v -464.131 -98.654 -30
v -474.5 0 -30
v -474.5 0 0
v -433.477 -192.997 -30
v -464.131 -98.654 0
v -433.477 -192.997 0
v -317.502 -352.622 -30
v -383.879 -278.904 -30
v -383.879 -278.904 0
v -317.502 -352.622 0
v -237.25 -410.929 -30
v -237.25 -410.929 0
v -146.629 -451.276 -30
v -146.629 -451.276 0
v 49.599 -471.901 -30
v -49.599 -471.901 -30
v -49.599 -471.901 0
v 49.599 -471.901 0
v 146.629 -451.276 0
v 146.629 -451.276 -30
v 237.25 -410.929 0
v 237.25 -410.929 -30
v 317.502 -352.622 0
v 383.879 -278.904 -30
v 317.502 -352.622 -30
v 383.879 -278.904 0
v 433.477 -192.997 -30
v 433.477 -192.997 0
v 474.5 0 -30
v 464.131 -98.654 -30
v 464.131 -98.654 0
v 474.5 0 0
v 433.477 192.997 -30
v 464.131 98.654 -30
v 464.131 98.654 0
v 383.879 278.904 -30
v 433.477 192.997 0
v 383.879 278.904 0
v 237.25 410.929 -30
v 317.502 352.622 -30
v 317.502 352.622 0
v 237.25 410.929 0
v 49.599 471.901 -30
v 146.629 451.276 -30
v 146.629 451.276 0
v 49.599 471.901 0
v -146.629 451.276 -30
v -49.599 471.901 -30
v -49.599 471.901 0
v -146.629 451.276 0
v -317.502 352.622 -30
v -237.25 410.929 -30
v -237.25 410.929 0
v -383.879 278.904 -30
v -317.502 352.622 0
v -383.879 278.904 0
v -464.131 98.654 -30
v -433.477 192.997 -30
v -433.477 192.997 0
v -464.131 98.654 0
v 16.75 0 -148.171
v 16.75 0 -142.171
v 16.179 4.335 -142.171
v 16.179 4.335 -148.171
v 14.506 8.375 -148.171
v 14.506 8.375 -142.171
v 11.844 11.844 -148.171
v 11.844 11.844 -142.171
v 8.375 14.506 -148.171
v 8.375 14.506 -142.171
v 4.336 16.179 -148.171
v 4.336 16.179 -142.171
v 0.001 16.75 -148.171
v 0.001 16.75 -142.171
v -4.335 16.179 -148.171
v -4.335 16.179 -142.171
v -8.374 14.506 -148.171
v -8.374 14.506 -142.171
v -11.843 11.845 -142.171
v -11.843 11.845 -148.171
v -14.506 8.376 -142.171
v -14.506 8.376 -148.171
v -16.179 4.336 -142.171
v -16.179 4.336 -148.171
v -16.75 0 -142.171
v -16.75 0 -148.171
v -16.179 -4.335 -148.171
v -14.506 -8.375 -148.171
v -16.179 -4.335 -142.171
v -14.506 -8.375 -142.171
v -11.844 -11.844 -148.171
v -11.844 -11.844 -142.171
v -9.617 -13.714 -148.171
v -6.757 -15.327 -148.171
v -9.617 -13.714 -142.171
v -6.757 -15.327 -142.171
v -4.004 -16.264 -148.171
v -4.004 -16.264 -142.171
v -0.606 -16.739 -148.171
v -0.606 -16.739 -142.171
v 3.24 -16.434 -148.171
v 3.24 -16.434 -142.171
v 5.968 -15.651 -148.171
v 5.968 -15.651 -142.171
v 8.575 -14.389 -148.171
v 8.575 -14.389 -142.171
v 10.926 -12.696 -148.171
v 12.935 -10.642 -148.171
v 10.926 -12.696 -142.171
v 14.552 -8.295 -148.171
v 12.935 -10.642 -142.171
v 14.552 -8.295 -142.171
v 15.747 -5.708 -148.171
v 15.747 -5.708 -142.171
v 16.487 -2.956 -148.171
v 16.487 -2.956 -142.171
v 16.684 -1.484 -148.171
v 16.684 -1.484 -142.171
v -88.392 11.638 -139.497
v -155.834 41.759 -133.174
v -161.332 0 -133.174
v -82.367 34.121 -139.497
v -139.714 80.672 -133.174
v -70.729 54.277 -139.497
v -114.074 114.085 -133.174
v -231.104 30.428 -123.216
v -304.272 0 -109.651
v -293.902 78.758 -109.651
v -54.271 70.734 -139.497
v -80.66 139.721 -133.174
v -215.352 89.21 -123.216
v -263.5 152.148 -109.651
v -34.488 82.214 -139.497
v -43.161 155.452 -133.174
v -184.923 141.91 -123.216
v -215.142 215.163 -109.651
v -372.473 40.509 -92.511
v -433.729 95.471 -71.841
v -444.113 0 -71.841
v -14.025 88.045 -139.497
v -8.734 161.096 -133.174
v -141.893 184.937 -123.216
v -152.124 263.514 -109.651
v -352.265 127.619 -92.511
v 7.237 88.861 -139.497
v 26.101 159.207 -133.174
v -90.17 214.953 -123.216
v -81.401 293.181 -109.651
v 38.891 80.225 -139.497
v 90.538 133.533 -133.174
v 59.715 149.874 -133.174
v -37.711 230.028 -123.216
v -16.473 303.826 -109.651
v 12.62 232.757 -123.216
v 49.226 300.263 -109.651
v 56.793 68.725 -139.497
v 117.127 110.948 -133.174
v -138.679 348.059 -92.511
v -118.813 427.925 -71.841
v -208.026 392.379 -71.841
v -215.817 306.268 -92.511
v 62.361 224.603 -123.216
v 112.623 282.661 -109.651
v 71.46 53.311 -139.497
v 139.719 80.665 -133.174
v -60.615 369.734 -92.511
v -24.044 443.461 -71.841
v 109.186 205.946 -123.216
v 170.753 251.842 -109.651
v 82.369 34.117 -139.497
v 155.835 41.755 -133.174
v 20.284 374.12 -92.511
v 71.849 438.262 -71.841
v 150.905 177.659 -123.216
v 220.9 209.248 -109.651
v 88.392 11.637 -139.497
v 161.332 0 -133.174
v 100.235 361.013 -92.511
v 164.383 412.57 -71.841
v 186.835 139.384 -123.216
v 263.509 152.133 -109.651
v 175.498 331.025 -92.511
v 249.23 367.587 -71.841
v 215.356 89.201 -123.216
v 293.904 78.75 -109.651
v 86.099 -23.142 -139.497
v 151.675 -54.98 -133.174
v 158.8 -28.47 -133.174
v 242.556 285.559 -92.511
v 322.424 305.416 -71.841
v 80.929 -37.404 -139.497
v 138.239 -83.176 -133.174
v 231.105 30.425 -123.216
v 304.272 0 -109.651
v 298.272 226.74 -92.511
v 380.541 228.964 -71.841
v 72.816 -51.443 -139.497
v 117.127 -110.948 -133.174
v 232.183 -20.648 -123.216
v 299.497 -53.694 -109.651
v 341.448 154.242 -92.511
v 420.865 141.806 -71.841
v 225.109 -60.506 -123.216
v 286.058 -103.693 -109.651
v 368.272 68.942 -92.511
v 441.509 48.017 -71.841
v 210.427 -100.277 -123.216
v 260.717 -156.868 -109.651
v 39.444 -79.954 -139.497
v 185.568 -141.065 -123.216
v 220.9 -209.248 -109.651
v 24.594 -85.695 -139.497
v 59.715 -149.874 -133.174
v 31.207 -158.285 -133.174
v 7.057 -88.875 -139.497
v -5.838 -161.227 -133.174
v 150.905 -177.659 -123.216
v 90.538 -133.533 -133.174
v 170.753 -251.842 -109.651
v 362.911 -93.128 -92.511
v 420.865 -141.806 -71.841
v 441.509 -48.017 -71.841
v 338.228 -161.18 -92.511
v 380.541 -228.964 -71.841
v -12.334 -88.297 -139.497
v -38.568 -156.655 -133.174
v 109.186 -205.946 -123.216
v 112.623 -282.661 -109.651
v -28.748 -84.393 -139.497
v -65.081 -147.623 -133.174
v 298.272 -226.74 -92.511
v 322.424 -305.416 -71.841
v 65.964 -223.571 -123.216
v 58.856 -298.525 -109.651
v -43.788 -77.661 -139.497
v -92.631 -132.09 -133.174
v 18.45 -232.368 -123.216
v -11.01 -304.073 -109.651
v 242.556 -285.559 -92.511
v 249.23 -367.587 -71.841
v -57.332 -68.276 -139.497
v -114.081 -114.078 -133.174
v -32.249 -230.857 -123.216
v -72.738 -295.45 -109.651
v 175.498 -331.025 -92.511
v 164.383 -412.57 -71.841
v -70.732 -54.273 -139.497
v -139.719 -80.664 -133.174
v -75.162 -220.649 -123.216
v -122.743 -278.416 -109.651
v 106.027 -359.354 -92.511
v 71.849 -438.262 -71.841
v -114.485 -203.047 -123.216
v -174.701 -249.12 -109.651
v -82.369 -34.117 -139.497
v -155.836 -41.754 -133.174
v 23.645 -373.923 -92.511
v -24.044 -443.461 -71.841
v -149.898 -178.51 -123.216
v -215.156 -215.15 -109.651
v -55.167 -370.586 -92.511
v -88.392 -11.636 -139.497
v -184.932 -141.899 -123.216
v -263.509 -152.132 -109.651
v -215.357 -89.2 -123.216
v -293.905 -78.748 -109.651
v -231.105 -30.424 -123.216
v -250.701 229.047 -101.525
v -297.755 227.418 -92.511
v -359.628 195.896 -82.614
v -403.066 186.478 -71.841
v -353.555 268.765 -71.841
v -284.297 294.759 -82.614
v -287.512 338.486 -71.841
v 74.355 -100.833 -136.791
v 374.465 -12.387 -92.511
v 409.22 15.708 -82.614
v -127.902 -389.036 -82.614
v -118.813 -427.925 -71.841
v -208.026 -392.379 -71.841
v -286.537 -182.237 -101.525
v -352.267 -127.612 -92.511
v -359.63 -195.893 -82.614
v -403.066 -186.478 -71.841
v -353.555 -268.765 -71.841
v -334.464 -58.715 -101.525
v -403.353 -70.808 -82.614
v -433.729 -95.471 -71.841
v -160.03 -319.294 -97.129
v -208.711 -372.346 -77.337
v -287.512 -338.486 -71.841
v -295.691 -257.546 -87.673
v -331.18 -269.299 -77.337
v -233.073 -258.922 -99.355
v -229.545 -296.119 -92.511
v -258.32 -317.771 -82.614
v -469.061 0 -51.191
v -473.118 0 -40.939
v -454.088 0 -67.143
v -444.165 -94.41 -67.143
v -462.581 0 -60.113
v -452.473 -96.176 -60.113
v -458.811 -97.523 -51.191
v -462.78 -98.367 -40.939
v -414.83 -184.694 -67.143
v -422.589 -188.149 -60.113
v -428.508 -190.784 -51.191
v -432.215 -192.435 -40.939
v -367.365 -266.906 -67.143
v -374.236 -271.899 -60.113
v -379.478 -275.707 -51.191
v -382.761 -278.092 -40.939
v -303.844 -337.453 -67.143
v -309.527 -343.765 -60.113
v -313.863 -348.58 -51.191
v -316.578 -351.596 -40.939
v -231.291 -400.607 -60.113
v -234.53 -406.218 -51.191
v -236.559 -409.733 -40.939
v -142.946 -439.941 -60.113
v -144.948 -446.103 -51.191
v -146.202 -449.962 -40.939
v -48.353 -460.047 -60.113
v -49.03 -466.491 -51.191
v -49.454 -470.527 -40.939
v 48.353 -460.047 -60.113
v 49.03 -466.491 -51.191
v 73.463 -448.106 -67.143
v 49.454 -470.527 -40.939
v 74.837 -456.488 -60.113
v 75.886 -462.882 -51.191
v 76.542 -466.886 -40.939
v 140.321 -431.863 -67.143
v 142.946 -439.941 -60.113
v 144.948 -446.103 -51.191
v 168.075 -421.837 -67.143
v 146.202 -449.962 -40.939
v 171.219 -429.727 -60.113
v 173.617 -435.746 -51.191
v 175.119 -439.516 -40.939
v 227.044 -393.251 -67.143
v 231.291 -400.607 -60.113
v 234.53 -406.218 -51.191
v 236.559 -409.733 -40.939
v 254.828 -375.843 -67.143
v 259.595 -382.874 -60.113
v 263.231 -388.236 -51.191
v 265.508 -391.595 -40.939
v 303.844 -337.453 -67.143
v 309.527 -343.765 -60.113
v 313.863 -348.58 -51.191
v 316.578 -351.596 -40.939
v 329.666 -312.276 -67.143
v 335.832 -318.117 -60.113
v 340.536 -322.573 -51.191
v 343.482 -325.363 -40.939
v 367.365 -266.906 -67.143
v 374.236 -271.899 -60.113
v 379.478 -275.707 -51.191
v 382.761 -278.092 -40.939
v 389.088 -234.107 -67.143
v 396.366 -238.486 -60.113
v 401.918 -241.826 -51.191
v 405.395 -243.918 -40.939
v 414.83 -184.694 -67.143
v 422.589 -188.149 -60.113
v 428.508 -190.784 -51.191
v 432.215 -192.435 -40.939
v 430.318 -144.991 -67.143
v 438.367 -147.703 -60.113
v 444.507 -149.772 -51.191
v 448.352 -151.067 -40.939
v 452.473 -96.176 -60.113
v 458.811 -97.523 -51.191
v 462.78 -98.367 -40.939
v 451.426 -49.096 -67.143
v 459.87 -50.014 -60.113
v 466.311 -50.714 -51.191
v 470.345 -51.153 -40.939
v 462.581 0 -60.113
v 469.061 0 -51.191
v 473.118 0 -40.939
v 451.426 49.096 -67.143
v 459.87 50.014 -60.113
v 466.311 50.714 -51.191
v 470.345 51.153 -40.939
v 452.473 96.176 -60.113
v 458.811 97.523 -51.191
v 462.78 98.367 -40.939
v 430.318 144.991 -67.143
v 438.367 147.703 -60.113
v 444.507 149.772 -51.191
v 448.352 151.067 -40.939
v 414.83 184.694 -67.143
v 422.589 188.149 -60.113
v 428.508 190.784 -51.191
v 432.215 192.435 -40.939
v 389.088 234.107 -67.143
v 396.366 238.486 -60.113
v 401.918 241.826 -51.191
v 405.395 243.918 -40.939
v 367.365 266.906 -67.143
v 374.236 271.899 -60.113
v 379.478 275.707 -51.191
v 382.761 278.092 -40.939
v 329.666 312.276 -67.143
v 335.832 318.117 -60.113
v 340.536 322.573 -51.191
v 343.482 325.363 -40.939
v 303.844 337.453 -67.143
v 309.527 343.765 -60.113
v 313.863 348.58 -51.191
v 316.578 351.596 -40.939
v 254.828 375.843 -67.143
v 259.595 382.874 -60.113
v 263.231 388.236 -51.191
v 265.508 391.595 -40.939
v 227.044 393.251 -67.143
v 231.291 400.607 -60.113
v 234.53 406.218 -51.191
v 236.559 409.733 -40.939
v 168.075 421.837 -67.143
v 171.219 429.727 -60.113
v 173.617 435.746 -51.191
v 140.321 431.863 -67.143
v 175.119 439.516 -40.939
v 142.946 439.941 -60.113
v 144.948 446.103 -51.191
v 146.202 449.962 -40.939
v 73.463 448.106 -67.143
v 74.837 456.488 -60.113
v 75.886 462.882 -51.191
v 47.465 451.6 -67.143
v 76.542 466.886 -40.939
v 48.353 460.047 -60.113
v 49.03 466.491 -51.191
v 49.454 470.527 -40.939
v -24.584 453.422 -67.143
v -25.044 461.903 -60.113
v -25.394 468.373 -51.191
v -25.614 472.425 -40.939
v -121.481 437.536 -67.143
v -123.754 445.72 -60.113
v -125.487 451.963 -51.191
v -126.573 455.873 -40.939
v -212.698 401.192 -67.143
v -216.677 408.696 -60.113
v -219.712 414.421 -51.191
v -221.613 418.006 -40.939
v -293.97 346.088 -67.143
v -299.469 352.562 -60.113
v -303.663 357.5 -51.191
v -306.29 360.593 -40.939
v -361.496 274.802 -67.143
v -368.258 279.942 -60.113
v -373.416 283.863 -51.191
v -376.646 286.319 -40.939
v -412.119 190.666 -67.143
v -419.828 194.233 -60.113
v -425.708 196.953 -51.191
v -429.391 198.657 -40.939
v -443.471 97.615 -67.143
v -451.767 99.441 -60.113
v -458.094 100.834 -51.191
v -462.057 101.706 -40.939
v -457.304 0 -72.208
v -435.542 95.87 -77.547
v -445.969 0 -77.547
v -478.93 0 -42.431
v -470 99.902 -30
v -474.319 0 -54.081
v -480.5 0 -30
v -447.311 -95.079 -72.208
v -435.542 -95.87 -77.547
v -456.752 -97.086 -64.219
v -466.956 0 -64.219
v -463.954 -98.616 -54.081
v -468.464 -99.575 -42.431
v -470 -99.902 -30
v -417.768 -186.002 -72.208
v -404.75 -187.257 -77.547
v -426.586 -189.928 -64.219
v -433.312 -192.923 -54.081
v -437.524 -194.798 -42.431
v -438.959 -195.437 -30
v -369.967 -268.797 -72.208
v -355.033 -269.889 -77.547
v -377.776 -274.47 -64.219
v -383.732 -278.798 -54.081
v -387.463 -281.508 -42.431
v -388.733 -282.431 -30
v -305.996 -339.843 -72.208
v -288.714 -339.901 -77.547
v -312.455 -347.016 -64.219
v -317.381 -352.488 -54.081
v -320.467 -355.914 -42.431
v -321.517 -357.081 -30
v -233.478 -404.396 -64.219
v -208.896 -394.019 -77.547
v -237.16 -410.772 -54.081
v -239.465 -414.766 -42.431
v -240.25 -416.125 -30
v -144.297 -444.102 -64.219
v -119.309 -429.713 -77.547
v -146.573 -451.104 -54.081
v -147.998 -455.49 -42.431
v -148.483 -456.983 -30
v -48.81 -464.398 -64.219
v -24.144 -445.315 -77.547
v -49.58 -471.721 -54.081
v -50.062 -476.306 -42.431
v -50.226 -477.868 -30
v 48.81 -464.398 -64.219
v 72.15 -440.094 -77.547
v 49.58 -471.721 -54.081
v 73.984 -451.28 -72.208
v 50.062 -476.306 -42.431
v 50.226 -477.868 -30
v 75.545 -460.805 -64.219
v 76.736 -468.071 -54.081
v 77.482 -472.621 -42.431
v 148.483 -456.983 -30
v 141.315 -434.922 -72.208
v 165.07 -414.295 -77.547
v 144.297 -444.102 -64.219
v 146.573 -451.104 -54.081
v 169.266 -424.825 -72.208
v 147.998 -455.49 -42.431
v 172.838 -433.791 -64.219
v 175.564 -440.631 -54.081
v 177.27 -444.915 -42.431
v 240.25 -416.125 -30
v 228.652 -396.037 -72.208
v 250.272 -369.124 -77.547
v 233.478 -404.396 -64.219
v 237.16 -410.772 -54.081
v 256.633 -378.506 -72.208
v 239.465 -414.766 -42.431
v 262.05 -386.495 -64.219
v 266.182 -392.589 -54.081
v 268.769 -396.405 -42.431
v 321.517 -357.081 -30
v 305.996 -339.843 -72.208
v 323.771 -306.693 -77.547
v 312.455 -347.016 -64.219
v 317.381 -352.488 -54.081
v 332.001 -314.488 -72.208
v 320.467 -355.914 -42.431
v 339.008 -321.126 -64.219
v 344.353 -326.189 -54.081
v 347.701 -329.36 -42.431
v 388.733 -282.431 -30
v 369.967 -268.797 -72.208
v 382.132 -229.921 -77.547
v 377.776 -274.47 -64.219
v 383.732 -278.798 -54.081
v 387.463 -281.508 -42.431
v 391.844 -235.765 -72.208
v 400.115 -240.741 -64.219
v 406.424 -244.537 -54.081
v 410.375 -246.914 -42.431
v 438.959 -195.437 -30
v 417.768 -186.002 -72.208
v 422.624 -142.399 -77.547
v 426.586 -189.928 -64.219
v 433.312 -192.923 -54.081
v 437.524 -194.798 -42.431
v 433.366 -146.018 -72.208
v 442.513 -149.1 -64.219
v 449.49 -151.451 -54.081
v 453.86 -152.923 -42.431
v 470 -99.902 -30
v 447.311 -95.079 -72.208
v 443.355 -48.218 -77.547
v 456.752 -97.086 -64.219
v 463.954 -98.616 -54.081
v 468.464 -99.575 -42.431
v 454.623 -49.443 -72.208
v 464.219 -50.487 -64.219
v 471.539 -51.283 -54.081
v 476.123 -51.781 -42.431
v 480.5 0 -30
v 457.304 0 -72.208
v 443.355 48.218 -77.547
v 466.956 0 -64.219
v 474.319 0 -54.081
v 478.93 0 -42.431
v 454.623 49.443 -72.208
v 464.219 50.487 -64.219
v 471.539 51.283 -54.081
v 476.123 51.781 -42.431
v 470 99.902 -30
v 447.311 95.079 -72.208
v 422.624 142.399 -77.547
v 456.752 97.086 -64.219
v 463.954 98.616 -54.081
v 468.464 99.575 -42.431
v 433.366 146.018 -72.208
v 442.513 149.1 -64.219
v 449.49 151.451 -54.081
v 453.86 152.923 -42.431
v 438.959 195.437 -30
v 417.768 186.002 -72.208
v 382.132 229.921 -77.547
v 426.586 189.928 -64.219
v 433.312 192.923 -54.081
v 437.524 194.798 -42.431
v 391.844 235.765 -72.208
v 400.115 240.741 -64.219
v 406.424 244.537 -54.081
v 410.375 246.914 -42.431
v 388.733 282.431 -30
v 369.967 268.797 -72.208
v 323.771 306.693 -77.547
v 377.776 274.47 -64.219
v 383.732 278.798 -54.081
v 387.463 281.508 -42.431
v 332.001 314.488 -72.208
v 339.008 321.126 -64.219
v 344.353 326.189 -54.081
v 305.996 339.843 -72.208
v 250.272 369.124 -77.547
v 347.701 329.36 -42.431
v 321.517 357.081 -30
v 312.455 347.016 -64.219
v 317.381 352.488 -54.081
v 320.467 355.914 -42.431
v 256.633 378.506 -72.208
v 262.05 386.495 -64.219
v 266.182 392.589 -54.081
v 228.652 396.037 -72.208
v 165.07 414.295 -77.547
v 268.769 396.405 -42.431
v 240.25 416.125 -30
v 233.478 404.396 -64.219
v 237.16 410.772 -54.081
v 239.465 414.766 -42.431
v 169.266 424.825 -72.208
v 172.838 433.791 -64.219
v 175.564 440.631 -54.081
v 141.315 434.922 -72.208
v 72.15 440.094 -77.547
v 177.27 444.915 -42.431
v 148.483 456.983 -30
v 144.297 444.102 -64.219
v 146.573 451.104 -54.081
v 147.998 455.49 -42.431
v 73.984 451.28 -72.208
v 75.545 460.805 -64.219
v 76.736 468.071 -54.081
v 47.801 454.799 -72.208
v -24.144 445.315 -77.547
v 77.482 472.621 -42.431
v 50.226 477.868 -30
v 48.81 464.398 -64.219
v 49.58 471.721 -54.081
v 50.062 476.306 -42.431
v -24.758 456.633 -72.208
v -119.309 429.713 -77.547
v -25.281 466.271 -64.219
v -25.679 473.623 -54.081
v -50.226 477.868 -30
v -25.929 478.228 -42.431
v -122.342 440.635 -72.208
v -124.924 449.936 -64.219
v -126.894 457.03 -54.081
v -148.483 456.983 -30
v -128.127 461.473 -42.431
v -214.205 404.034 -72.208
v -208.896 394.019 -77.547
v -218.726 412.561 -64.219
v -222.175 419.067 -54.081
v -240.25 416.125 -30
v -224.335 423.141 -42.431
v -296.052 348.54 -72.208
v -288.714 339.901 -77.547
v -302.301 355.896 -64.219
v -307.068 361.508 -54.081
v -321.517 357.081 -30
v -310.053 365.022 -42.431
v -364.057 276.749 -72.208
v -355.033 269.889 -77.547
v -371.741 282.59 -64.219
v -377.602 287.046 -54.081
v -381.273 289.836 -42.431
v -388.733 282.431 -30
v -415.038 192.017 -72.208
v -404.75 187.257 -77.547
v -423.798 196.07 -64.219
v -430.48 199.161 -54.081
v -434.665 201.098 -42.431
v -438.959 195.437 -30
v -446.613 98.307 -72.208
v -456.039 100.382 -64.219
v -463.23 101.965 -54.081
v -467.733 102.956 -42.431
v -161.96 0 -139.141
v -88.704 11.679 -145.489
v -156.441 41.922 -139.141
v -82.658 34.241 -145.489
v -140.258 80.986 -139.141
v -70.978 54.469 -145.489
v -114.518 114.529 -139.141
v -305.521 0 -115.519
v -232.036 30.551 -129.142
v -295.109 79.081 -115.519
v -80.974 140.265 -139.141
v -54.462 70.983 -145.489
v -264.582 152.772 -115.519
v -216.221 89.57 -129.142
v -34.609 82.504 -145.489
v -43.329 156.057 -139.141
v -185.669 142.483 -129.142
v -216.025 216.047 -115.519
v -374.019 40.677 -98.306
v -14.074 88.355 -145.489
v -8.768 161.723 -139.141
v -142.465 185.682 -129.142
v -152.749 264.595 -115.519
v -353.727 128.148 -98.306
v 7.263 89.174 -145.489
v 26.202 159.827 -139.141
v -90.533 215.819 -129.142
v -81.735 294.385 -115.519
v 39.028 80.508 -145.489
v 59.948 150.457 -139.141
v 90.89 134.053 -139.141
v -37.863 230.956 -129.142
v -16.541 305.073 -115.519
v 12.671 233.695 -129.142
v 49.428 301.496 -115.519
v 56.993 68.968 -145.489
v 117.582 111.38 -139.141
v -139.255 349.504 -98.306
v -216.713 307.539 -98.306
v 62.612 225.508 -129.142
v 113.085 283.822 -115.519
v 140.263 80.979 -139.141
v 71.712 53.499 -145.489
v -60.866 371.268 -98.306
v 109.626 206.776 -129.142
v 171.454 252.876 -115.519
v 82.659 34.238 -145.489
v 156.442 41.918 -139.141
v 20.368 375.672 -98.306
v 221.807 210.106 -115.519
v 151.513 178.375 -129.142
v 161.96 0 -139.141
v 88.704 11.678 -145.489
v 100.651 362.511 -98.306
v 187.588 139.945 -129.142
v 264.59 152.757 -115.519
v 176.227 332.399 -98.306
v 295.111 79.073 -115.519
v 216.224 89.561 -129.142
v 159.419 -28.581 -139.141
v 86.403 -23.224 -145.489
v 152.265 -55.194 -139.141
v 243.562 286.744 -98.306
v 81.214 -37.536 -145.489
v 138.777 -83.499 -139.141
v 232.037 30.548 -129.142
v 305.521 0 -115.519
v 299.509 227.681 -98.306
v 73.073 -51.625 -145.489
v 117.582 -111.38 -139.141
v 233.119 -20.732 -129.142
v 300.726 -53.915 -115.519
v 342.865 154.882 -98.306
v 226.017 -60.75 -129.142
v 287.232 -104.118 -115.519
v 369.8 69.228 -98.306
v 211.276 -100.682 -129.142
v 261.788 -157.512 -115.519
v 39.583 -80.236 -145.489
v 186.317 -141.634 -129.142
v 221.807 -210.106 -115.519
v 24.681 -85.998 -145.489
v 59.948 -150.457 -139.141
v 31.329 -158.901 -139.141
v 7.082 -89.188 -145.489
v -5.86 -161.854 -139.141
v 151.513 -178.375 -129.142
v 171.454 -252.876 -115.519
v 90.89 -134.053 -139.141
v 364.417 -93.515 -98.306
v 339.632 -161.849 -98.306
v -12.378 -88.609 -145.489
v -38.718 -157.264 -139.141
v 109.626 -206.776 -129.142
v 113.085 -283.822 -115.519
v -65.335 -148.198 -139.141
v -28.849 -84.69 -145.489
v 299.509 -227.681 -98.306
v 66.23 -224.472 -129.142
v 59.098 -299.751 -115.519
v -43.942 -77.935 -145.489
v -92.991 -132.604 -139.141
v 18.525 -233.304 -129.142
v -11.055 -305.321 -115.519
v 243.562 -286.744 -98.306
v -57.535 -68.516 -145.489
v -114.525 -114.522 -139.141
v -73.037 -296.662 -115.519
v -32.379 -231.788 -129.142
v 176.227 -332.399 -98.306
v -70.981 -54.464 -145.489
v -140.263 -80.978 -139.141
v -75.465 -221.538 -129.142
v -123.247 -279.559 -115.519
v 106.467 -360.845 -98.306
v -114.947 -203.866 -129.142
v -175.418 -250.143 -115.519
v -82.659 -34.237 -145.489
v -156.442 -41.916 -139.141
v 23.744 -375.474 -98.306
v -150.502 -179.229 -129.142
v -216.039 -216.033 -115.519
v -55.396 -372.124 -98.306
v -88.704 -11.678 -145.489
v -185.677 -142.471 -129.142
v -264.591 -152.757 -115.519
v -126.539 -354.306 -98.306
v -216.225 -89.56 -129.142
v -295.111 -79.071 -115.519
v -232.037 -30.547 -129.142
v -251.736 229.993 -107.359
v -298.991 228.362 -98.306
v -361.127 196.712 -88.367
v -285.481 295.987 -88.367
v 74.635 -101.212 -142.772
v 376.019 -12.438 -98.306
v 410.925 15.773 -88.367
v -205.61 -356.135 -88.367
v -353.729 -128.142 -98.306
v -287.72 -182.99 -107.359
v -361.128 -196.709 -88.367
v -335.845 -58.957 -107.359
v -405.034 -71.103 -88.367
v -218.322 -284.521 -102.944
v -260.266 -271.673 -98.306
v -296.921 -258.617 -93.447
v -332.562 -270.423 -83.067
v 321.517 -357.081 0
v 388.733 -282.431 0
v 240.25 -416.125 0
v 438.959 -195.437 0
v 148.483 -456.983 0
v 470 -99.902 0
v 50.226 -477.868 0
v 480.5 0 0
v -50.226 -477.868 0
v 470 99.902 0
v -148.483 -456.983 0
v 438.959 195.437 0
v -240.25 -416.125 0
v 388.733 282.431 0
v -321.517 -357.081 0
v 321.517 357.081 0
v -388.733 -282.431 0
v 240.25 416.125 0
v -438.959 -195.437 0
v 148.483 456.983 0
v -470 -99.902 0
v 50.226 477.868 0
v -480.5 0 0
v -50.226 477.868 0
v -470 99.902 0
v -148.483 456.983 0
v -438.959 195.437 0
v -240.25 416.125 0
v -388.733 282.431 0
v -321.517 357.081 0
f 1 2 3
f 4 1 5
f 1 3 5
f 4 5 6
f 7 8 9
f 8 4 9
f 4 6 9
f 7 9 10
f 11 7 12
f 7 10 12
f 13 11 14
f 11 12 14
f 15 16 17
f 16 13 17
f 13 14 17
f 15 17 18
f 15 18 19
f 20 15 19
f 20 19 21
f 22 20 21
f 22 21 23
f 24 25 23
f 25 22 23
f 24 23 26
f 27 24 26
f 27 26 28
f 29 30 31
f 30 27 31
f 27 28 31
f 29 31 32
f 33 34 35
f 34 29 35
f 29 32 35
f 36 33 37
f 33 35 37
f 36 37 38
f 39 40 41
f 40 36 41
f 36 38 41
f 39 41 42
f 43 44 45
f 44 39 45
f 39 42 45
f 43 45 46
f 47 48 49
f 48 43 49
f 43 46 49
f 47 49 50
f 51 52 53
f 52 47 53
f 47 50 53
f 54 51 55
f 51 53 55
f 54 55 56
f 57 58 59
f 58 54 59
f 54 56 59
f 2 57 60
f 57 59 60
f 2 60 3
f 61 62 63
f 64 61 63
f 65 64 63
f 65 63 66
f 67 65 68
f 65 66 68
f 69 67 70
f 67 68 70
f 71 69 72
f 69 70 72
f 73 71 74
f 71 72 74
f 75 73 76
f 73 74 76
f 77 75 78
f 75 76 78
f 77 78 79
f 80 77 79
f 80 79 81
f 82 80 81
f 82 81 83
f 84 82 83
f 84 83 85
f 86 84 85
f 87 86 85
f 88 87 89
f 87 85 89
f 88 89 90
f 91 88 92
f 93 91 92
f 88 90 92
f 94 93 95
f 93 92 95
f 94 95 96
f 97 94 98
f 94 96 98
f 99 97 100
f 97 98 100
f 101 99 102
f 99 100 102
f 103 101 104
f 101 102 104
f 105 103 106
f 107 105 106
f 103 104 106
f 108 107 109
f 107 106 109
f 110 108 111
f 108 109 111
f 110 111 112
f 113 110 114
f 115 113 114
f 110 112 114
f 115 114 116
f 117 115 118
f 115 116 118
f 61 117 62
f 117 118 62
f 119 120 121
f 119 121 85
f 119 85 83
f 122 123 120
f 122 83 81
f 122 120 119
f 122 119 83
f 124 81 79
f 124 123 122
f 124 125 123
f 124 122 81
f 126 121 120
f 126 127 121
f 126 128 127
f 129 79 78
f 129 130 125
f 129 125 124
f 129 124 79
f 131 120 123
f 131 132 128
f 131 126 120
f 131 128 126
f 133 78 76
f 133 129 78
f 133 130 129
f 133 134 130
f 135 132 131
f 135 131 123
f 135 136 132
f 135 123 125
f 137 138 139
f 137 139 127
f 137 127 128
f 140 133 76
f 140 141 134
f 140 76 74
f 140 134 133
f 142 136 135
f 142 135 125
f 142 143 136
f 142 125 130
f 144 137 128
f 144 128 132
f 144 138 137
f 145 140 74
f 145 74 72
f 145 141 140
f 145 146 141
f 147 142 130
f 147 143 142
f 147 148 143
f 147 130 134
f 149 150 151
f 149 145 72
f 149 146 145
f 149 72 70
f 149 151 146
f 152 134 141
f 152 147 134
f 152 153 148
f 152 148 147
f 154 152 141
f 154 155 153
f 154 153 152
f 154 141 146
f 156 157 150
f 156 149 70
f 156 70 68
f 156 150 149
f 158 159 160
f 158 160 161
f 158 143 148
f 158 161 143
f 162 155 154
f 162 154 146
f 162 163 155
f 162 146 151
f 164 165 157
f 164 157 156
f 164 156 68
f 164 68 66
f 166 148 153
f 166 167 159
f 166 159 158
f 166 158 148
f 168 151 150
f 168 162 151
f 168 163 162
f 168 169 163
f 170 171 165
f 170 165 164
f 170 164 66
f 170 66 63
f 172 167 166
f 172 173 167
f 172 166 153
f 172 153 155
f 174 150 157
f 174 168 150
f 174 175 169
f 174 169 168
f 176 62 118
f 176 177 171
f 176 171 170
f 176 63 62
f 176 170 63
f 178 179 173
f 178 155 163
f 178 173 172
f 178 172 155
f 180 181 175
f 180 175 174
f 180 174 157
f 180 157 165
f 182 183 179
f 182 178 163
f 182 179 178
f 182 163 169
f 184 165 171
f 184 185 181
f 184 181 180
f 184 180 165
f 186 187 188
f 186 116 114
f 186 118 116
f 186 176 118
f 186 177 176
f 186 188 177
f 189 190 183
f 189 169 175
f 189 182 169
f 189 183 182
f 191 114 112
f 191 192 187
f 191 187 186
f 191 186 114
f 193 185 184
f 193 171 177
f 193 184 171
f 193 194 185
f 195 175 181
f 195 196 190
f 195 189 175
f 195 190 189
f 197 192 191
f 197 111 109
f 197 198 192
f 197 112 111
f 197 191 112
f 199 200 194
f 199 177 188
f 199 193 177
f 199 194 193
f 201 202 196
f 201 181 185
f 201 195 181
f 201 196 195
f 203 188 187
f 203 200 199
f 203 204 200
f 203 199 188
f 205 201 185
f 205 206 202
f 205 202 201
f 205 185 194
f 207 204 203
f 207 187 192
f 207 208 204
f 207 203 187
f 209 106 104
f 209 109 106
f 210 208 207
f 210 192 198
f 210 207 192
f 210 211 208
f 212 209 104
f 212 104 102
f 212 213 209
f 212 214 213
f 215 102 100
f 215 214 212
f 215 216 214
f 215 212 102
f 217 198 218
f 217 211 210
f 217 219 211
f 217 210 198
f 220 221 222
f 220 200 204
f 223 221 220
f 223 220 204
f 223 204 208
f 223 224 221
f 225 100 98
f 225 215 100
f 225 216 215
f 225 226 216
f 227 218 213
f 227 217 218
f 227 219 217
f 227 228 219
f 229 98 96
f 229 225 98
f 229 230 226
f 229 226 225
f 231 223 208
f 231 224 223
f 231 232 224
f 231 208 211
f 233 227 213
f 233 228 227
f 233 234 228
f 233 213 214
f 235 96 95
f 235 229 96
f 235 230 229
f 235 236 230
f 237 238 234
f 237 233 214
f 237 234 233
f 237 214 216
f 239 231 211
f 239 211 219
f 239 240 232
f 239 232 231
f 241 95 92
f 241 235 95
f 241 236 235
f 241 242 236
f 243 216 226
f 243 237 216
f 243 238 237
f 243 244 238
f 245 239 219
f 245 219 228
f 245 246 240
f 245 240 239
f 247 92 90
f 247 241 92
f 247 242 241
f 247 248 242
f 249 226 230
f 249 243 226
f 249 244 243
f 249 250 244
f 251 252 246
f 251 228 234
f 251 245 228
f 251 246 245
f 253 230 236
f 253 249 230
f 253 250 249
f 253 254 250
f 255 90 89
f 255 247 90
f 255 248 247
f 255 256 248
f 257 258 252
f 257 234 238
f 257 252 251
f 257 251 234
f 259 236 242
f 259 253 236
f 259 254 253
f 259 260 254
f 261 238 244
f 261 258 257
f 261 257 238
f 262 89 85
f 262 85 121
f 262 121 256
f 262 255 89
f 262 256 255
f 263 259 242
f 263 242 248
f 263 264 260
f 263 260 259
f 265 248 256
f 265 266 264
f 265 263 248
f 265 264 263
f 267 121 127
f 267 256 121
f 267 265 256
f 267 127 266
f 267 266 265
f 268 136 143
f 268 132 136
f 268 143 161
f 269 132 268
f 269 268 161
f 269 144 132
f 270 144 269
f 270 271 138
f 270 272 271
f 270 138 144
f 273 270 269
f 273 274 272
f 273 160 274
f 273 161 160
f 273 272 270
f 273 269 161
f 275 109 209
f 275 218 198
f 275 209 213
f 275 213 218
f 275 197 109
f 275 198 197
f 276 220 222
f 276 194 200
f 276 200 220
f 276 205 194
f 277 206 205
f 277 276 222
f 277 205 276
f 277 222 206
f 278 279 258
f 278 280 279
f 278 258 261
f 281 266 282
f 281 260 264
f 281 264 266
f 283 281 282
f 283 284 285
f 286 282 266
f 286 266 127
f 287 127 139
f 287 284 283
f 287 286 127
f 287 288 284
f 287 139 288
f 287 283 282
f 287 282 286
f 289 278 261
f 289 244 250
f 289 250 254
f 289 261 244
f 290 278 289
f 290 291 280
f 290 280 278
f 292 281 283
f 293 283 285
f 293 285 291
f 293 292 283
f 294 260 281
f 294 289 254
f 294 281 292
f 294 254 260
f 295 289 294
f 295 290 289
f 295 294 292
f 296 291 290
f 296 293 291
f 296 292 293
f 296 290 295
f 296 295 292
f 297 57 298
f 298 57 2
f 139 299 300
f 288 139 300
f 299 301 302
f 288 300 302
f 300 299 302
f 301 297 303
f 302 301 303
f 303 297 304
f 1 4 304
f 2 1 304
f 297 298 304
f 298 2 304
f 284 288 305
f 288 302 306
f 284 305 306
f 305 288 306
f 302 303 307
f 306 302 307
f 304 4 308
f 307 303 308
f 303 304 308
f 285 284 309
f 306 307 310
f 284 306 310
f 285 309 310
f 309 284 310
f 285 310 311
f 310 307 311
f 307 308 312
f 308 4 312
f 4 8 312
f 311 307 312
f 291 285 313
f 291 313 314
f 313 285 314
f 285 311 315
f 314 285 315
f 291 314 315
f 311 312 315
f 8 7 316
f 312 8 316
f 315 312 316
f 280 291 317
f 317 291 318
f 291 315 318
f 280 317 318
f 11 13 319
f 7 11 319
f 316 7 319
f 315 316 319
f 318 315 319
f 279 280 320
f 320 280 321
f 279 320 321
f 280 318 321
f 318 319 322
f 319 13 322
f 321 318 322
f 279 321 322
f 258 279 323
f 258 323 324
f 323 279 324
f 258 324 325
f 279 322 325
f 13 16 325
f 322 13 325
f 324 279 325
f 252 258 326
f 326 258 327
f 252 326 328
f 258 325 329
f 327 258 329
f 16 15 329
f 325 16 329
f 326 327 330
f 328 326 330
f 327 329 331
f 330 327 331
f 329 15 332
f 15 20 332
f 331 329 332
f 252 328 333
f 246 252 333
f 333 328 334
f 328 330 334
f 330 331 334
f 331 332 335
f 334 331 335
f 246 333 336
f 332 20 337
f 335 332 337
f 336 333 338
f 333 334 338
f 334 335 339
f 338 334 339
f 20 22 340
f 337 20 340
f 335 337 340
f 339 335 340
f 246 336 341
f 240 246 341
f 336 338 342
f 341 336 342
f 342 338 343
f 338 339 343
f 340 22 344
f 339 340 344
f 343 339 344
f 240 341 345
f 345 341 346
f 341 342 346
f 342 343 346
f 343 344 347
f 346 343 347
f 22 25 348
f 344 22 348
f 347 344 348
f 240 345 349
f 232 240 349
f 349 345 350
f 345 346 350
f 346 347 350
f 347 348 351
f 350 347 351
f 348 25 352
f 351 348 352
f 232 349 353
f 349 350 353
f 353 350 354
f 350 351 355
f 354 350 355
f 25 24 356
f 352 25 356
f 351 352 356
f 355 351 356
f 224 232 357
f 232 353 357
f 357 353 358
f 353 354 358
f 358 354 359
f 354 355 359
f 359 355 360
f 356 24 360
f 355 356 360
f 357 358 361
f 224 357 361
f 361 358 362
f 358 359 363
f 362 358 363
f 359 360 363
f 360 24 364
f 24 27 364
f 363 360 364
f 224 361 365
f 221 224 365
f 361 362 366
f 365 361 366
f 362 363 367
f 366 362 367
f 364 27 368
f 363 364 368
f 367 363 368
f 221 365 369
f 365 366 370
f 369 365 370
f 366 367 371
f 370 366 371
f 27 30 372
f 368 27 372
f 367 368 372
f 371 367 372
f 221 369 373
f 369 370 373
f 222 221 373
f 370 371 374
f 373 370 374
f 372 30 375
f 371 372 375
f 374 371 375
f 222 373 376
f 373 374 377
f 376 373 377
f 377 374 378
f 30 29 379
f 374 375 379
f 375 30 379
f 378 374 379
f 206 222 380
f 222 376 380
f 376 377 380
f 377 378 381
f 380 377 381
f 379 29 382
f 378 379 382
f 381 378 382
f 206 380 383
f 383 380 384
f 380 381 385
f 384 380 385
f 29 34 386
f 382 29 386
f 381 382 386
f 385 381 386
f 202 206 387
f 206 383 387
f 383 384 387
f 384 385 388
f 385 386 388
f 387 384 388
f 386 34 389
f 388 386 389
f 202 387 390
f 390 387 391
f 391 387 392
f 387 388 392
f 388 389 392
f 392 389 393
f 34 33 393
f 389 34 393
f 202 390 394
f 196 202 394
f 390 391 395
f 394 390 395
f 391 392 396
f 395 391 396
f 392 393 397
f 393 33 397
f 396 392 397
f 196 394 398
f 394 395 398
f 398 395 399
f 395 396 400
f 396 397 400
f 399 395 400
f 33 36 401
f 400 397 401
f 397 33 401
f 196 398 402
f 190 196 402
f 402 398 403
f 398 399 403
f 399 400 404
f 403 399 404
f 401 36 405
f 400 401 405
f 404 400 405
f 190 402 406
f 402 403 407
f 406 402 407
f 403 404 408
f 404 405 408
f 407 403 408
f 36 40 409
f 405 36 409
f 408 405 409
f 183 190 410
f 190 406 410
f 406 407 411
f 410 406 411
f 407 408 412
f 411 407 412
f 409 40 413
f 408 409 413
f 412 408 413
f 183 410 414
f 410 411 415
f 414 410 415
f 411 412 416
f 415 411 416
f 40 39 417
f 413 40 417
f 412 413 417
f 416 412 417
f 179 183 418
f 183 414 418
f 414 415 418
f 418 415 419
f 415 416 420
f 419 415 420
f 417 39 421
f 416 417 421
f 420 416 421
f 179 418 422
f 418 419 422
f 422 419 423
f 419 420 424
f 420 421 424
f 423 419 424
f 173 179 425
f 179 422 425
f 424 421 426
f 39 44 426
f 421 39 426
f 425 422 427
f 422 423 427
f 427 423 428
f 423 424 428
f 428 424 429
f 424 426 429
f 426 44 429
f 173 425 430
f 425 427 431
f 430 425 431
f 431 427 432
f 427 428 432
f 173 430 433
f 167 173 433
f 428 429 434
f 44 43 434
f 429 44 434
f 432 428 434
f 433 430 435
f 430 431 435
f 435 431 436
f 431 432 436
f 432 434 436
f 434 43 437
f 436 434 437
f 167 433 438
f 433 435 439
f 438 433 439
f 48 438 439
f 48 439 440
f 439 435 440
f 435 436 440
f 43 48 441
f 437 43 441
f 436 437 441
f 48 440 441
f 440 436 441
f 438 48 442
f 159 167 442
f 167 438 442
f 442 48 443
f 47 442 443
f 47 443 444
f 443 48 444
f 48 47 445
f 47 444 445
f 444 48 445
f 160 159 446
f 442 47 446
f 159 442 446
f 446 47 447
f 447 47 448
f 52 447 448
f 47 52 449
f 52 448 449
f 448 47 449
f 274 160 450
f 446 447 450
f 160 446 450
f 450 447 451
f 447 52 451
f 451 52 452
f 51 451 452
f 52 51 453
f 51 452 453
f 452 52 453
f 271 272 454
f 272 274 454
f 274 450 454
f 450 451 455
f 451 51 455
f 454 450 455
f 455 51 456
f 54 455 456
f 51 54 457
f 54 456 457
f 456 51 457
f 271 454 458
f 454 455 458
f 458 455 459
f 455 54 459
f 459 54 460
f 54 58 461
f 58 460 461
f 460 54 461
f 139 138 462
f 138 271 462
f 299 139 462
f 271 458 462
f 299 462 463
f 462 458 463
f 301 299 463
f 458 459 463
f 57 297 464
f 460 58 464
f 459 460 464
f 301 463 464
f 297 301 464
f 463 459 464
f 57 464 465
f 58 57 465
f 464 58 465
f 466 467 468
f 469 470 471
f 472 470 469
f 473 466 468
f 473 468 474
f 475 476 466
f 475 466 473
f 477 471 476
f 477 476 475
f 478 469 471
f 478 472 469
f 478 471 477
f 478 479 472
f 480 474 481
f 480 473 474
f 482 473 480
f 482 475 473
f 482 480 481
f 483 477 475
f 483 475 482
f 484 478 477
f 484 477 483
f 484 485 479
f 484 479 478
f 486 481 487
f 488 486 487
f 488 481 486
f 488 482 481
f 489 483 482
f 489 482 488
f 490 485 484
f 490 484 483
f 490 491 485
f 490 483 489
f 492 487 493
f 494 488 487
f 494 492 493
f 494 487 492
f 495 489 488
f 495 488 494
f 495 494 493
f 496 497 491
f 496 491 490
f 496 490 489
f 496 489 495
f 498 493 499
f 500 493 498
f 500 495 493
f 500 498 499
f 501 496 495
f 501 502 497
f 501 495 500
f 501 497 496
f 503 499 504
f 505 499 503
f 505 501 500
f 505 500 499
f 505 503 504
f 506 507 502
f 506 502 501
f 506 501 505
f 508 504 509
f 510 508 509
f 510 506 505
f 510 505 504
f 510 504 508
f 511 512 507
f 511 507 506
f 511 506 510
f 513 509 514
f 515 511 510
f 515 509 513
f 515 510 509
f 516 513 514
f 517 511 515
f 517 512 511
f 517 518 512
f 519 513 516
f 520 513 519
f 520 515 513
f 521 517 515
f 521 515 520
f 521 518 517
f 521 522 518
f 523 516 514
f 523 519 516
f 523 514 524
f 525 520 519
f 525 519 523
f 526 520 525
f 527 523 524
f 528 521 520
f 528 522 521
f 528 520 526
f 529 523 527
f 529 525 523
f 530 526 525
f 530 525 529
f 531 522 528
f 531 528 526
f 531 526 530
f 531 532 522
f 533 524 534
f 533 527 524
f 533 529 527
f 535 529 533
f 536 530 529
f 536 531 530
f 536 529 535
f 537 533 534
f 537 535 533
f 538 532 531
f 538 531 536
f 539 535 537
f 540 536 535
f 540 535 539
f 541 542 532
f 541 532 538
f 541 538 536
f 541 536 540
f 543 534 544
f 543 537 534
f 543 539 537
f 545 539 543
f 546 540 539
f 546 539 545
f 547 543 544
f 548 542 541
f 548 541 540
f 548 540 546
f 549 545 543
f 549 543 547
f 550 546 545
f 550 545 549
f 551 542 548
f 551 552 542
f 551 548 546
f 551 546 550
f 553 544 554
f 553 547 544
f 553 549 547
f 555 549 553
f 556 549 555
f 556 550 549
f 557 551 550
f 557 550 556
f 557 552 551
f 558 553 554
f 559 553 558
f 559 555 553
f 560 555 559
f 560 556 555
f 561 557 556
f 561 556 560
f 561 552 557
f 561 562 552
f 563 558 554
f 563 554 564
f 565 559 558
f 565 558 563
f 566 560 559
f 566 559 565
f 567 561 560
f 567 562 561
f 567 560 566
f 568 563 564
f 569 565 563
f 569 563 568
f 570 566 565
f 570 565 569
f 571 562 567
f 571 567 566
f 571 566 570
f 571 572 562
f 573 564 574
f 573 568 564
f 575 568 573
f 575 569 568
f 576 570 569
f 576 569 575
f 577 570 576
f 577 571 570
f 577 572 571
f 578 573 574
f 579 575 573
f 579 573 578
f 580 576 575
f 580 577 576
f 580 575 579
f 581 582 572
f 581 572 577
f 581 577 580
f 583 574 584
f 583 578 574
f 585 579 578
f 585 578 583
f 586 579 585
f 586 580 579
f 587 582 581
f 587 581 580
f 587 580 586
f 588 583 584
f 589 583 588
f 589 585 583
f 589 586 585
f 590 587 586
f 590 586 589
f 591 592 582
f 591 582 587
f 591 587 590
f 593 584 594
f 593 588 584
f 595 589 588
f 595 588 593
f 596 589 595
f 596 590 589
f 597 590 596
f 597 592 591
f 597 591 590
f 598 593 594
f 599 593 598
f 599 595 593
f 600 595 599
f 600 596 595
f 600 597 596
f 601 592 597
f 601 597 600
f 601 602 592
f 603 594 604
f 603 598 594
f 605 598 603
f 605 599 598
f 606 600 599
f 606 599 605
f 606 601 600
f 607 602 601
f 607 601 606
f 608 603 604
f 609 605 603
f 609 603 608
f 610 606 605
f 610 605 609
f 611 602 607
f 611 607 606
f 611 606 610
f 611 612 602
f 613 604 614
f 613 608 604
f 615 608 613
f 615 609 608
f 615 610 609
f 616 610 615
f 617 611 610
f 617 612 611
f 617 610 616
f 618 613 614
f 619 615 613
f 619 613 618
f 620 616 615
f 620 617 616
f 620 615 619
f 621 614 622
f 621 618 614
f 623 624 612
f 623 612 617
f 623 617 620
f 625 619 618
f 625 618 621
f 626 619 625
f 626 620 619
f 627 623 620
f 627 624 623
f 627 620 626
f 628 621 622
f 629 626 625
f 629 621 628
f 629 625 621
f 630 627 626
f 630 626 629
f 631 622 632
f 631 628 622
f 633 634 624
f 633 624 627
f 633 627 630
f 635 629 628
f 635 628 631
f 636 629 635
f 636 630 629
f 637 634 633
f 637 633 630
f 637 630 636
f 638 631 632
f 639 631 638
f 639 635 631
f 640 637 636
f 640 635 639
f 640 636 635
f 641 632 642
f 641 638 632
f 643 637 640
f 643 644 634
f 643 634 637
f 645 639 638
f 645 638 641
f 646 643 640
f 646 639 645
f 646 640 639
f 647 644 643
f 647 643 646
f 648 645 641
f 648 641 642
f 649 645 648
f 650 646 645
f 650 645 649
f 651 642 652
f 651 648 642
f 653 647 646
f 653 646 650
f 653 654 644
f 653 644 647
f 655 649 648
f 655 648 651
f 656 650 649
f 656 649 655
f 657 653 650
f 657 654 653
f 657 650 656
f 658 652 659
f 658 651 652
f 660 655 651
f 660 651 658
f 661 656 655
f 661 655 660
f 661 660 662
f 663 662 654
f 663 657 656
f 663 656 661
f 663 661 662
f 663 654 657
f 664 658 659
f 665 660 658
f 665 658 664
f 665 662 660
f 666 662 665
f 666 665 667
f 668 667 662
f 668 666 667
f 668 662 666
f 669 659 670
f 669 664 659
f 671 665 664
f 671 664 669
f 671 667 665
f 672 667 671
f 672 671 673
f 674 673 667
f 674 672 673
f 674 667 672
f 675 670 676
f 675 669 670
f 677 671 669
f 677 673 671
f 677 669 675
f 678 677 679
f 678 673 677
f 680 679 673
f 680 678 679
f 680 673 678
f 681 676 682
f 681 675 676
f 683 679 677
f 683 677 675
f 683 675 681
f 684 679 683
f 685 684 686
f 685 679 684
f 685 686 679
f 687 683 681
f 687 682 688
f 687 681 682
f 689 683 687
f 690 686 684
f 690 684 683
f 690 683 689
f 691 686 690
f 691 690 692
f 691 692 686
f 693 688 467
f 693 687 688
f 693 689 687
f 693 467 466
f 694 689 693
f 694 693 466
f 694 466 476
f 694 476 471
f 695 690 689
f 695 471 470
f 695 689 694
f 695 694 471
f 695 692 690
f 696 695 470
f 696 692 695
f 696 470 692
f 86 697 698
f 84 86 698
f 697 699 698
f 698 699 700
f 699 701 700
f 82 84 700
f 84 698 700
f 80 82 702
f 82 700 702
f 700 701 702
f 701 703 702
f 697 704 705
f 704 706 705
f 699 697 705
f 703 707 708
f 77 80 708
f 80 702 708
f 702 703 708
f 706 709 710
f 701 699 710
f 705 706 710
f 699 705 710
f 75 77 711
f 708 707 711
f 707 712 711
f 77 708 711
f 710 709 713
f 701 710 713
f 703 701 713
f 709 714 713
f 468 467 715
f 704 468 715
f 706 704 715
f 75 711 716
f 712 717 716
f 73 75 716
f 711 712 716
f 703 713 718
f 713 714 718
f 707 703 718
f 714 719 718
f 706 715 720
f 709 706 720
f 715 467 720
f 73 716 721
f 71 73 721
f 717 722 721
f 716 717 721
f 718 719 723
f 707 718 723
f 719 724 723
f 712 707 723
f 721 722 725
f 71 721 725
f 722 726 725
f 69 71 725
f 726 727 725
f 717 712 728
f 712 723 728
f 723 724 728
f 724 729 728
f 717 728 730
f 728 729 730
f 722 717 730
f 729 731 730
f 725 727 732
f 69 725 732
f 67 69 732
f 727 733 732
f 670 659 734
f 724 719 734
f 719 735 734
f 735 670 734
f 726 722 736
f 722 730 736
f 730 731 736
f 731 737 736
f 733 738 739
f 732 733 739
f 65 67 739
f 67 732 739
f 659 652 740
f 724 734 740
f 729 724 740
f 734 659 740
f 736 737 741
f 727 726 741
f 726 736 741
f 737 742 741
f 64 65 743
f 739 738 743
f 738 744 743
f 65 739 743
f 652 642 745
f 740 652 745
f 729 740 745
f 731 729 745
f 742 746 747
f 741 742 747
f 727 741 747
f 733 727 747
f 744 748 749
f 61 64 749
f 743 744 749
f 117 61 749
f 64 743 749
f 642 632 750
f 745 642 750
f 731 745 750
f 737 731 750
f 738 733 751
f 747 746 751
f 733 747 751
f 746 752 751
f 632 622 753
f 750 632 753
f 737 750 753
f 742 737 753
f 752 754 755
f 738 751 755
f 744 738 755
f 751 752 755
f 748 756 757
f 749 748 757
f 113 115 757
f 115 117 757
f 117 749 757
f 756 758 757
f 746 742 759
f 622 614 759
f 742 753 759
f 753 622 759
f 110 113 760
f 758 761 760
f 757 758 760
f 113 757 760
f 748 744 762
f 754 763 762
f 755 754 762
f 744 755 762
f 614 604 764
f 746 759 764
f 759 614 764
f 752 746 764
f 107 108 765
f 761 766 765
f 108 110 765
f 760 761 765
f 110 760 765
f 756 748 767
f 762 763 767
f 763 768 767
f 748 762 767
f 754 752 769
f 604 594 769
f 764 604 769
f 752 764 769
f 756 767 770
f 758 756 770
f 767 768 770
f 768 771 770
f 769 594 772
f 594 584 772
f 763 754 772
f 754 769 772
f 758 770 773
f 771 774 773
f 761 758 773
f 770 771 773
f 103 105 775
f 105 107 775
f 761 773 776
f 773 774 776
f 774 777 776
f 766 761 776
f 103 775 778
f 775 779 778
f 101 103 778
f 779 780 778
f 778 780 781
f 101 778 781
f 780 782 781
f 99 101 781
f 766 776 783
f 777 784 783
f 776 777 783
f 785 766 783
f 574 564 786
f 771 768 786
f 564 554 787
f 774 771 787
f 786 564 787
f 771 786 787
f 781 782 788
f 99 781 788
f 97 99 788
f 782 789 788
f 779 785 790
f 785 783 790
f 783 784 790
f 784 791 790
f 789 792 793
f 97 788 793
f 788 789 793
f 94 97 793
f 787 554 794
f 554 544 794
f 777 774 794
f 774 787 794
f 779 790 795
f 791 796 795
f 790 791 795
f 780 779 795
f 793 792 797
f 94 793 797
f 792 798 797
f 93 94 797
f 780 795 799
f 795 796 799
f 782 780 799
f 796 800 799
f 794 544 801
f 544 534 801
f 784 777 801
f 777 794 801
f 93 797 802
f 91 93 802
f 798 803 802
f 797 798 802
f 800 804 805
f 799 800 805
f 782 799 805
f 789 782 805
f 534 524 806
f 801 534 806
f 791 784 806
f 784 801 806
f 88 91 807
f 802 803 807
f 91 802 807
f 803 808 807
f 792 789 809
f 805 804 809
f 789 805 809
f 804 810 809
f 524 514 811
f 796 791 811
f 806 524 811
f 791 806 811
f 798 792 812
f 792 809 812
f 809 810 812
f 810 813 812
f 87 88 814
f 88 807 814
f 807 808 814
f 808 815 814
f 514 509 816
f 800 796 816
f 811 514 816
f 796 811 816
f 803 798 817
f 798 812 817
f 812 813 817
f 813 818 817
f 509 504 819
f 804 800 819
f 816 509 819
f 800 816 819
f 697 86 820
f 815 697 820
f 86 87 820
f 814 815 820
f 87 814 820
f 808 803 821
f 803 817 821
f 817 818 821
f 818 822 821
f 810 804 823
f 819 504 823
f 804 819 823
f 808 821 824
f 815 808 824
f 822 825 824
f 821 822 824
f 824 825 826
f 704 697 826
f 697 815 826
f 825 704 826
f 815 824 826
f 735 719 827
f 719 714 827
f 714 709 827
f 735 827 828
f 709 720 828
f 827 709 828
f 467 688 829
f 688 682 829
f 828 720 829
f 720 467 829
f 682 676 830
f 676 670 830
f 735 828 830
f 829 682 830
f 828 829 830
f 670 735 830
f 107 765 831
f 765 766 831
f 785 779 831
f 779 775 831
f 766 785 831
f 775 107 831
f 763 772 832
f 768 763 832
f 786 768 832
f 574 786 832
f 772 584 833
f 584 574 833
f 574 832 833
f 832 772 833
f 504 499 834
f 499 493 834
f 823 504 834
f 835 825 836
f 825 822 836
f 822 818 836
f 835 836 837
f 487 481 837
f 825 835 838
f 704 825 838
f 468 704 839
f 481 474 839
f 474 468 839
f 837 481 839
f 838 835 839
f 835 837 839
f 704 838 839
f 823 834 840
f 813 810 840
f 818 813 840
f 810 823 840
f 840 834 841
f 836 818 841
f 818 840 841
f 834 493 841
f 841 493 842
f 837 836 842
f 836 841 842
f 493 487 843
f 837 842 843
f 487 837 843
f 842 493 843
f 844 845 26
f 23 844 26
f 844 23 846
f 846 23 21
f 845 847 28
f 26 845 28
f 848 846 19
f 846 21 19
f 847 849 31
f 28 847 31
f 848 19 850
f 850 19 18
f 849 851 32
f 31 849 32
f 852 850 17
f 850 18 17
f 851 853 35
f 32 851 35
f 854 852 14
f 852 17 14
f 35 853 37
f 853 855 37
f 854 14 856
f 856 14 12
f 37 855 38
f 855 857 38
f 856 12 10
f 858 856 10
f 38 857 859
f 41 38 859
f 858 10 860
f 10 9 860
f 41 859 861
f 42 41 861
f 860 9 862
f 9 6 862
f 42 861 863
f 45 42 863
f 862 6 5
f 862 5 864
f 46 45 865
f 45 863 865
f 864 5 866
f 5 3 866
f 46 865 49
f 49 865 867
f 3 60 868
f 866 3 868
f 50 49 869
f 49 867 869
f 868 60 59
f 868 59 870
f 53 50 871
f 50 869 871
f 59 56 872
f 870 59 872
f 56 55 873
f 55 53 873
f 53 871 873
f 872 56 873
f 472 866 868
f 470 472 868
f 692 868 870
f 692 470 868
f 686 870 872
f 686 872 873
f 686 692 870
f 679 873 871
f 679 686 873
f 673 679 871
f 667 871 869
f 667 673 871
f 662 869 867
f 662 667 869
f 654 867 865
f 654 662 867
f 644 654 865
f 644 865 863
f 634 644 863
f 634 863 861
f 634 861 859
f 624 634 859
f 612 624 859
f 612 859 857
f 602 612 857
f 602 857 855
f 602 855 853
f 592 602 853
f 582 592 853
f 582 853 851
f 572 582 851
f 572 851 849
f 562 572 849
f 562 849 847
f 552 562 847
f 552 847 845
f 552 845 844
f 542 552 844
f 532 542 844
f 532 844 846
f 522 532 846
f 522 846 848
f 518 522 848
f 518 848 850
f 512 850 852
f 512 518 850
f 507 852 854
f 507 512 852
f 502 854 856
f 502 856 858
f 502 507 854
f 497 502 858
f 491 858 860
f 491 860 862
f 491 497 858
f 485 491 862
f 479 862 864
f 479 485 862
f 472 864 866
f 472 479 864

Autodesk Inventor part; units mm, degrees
ref_plane "YZ Plane" through (0, 0, 0) normal (1, 0, 0) x (0, 1, 0)
ref_plane "XZ Plane" through (0, 0, 0) normal (0, 1, 0) x (-1, 0, 0)
ref_plane "XY Plane" through (0, 0, 0) normal (0, 0, 1) x (1, 0, 0)
sketch "Sketch1" plane through (0, 0, 0) normal (0, 1, 0) x (-1, 0, 0)
  line L0 (480.5, 0) -> (480.5, -30)
  arc A0 (445.9689, -77.547) -> (480.5, -30) centre (430.5, -30) ccw
  arc A1 (0, -148.2683) -> (445.9689, -77.547) centre (0, 1293.2317) ccw
  line L1 (0, 191.6842) -> (0, -191.6842)
  arc A2 (0, -142.2683) -> (444.1126, -71.8413) centre (0, 1293.2317) ccw
  arc A3 (444.1126, -71.8413) -> (474.5, -30) centre (430.5, -30) ccw
  line L2 (474.5, -30) -> (474.5, 0)
  line L3 (474.5, 0) -> (480.5, 0)
  line L4 (0, -142.2683) -> (0, -148.2683)
  point P0 (0, 0)
  point P1 (0, 0)
  point P2 (0, -145.2683)
  dimension "d0" = 50
  dimension "d1" = 30
  dimension "d3" = 1441.5
  dimension "d4" = 480.5
  dimension "d6" = 6
revolve "Revolution1" add sketch "Sketch1" angle 360 about axis through (0, 0, 191.6842) along (0, 0, -1)
sketch "Sketch2" plane through (0, 0, 0) normal (0, 0, 1) x (1, 0, 0)
  circle A0 centre (0, 0) radius 16.75
  dimension "d8" = 33.5
extrude "Extrusion1" cut sketch "Sketch2" against normal through all
properties part number "Сферическое дно D1000"
